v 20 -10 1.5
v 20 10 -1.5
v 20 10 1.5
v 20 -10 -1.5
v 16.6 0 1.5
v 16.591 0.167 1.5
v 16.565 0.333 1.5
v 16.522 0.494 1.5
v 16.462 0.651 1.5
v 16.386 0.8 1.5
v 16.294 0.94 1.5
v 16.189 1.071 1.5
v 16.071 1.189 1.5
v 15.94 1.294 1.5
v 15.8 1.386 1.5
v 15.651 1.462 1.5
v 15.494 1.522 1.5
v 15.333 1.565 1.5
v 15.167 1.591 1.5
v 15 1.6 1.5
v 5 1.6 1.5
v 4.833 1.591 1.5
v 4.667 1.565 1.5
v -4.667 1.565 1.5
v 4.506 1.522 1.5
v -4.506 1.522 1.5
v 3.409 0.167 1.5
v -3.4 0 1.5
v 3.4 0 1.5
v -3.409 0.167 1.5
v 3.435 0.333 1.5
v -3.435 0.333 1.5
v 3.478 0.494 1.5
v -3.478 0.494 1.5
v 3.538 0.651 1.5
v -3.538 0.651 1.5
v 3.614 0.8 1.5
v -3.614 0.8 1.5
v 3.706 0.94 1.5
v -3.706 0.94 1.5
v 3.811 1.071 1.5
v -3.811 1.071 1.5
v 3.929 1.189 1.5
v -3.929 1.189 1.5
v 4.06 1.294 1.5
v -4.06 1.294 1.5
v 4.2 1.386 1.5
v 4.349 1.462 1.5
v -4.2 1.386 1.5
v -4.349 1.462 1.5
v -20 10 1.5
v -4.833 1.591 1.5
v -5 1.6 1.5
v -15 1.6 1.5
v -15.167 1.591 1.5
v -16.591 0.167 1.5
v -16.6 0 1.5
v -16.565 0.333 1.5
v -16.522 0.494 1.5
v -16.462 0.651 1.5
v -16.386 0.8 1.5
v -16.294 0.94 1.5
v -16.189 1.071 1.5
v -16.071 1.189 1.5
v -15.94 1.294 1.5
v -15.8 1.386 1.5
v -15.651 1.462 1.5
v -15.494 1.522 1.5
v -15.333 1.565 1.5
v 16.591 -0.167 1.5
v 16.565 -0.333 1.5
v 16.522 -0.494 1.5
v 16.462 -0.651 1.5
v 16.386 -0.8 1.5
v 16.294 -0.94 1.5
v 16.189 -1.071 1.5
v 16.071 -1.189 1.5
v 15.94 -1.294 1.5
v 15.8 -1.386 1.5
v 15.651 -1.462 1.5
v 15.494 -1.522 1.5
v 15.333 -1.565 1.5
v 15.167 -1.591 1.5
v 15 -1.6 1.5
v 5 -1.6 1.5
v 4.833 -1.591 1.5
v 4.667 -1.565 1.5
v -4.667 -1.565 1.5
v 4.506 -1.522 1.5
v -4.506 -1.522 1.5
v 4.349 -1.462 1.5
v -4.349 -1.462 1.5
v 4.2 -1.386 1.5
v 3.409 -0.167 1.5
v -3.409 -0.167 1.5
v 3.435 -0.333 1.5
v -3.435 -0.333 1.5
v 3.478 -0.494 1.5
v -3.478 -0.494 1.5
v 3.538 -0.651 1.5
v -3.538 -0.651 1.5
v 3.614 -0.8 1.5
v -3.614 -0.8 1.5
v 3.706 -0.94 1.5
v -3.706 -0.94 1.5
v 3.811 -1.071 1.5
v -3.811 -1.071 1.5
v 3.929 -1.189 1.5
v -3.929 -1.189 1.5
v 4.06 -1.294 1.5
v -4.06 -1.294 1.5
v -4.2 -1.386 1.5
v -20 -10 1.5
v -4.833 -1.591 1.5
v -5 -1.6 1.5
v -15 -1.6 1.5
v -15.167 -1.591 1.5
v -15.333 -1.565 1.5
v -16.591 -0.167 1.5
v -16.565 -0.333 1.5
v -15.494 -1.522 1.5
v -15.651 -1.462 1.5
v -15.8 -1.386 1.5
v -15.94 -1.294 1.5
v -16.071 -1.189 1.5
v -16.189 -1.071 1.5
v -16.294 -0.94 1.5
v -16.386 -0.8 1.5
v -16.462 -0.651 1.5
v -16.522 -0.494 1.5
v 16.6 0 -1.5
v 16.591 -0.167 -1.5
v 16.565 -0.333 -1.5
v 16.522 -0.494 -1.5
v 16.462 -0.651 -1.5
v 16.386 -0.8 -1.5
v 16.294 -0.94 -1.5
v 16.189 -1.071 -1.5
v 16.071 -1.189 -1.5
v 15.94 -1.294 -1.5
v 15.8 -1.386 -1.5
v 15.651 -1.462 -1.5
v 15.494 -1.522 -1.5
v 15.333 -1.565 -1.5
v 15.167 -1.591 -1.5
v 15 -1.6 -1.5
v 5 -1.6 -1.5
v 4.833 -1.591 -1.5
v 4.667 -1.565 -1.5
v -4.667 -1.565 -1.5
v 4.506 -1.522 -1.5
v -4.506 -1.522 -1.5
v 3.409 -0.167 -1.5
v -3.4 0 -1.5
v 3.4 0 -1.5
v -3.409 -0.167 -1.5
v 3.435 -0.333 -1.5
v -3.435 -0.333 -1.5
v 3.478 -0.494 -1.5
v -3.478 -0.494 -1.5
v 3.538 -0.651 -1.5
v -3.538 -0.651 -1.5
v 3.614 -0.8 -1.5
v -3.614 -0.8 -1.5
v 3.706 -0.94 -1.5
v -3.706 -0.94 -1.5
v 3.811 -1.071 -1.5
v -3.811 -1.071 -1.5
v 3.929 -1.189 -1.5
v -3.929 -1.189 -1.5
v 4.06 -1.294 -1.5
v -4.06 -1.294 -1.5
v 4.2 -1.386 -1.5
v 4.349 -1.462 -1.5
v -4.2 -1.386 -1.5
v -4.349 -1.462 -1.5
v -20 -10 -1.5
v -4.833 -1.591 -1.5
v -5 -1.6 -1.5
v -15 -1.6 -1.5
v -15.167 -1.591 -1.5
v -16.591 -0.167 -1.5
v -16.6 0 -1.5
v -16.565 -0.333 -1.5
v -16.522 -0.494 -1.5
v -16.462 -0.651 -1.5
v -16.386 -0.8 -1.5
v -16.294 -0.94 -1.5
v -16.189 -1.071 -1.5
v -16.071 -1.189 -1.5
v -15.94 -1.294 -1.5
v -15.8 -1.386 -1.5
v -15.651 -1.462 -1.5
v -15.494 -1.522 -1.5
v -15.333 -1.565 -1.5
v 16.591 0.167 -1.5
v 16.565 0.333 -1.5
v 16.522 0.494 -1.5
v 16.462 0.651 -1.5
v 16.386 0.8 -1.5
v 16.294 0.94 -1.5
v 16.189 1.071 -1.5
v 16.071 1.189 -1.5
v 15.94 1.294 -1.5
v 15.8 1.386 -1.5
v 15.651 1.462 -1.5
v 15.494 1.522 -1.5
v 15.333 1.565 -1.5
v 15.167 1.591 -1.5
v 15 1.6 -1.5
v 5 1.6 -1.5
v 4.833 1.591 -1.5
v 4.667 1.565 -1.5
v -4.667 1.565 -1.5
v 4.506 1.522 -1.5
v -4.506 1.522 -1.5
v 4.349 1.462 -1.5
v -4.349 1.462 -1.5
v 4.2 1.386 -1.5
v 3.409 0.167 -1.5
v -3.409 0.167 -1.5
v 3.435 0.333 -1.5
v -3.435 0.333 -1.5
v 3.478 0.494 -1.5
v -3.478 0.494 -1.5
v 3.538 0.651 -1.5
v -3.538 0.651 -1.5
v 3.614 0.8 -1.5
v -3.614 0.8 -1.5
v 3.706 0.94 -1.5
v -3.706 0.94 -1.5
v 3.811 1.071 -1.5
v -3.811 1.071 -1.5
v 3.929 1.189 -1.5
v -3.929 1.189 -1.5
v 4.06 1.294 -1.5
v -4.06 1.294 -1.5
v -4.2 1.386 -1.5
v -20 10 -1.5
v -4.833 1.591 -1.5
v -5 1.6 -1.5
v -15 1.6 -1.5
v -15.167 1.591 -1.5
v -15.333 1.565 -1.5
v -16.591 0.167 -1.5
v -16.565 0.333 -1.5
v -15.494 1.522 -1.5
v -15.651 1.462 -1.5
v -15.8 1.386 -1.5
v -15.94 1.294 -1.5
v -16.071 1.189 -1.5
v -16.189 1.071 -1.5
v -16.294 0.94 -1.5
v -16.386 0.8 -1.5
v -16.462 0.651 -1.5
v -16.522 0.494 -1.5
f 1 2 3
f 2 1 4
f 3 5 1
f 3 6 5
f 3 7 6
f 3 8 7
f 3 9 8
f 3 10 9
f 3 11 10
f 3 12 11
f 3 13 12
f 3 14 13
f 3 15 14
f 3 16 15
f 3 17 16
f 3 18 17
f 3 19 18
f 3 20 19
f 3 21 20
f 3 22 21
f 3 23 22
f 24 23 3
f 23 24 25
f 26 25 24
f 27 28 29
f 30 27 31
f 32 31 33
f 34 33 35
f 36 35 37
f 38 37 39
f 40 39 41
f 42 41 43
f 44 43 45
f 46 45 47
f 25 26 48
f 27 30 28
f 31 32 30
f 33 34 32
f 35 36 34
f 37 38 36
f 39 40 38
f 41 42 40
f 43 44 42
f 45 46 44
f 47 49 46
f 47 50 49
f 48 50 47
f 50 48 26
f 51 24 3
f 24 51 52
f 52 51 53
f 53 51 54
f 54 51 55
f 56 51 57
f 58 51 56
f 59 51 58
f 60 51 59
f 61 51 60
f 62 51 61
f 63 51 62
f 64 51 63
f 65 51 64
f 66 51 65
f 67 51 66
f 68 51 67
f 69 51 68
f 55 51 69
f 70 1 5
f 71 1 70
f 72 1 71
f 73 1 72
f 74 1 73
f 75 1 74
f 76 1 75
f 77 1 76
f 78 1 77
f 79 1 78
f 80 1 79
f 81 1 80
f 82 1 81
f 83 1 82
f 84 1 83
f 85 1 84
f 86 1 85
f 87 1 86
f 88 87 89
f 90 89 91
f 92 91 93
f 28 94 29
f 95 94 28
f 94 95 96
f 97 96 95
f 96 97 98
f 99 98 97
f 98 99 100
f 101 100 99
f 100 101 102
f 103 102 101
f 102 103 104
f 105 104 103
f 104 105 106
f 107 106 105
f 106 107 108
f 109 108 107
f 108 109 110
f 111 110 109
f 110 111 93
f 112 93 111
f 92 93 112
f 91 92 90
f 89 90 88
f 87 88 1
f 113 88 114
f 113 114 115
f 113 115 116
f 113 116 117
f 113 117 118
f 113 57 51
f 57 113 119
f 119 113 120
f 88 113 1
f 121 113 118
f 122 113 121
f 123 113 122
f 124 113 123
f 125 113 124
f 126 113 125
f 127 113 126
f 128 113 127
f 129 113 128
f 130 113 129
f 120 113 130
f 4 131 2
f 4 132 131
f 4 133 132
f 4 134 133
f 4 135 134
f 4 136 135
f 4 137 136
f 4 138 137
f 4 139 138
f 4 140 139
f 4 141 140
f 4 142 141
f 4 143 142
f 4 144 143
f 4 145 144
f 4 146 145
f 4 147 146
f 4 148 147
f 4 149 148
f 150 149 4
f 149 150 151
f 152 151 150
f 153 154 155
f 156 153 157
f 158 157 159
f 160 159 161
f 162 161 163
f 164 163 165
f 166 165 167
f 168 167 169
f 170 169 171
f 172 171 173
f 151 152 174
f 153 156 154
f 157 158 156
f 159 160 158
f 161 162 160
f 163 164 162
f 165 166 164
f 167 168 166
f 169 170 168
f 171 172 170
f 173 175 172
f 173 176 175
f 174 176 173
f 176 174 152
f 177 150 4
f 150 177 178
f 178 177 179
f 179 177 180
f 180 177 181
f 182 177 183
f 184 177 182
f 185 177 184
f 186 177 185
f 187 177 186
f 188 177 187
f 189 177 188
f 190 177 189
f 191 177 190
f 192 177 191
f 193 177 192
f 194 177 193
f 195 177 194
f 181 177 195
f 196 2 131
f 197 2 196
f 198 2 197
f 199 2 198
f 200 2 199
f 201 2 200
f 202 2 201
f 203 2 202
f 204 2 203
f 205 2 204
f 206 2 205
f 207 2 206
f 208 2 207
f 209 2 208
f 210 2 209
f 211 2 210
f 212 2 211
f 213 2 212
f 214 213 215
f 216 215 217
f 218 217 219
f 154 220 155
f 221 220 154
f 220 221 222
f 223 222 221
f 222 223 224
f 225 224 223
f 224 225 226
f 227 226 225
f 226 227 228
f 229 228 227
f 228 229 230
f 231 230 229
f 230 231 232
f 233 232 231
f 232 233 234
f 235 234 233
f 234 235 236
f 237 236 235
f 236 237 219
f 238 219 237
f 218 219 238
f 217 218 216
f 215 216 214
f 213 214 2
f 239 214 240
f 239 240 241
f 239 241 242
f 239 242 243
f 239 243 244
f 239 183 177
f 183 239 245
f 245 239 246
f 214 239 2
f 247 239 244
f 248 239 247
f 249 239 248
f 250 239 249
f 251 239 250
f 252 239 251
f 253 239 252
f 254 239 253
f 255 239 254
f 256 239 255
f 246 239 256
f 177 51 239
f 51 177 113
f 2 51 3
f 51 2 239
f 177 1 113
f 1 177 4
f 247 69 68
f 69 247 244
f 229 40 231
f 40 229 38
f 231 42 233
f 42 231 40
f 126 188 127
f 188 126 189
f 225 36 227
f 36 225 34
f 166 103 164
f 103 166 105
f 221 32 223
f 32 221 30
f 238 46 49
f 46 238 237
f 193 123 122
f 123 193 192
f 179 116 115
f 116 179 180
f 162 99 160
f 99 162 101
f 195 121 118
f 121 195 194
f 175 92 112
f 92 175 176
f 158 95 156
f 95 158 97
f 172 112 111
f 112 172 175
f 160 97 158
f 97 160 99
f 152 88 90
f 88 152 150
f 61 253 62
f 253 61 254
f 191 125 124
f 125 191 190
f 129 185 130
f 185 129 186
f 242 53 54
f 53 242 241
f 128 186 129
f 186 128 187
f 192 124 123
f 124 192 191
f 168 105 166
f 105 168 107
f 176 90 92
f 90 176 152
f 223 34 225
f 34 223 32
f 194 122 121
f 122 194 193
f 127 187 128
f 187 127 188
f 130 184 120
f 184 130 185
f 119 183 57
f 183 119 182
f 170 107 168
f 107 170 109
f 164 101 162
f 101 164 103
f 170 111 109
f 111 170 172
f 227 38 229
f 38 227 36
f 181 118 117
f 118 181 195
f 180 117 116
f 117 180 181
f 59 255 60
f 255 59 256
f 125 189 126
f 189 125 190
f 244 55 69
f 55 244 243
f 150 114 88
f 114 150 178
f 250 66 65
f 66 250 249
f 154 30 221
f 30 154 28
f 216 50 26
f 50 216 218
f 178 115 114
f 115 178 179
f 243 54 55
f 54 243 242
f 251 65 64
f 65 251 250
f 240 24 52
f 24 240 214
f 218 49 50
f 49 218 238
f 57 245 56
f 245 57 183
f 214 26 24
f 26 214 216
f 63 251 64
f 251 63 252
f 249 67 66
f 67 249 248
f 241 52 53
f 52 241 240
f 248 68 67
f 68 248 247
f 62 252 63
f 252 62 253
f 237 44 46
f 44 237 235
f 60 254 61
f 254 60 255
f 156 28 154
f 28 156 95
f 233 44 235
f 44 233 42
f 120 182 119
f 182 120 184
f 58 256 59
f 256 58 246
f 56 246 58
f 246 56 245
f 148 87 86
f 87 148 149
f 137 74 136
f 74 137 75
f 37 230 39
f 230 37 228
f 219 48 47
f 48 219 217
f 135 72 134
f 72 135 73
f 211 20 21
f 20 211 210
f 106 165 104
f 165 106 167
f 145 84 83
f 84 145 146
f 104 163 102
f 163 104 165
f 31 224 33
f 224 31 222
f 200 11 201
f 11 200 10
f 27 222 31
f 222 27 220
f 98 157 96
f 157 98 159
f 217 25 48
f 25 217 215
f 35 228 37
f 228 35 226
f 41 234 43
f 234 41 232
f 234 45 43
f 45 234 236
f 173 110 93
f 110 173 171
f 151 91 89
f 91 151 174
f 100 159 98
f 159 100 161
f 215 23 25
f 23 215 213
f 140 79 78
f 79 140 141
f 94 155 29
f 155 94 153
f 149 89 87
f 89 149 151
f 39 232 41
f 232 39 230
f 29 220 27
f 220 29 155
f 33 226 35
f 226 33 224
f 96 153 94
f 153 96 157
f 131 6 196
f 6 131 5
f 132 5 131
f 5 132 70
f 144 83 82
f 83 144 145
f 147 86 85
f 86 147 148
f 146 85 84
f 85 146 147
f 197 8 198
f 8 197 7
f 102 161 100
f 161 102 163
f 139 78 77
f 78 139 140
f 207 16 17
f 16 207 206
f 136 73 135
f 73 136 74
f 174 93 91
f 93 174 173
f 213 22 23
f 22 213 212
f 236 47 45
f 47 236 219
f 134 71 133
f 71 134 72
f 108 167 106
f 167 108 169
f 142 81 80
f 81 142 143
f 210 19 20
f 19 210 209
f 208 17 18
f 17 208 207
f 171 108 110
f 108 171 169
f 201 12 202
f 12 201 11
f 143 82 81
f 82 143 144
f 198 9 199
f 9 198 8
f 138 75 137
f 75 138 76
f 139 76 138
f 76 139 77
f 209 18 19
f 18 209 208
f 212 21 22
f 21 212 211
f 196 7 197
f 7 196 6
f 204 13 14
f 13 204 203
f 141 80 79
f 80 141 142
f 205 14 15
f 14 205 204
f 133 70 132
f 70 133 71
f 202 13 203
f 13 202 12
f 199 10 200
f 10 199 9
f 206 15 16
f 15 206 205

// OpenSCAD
// Limit-switch mounting plate.
$fn = 60;
eps = 0.02;
plate_l = 40;
plate_w = 20;
plate_t = 3;
slot_l = 10;
module slot(x) { hull() { translate([x-slot_l/2,0,-plate_t/2-eps]) cylinder(d=3.2,h=plate_t+2*eps); translate([x+slot_l/2,0,-plate_t/2-eps]) cylinder(d=3.2,h=plate_t+2*eps); } }
difference() { cube([plate_l,plate_w,plate_t],center=true); slot(-plate_l/4); slot(plate_l/4); }
